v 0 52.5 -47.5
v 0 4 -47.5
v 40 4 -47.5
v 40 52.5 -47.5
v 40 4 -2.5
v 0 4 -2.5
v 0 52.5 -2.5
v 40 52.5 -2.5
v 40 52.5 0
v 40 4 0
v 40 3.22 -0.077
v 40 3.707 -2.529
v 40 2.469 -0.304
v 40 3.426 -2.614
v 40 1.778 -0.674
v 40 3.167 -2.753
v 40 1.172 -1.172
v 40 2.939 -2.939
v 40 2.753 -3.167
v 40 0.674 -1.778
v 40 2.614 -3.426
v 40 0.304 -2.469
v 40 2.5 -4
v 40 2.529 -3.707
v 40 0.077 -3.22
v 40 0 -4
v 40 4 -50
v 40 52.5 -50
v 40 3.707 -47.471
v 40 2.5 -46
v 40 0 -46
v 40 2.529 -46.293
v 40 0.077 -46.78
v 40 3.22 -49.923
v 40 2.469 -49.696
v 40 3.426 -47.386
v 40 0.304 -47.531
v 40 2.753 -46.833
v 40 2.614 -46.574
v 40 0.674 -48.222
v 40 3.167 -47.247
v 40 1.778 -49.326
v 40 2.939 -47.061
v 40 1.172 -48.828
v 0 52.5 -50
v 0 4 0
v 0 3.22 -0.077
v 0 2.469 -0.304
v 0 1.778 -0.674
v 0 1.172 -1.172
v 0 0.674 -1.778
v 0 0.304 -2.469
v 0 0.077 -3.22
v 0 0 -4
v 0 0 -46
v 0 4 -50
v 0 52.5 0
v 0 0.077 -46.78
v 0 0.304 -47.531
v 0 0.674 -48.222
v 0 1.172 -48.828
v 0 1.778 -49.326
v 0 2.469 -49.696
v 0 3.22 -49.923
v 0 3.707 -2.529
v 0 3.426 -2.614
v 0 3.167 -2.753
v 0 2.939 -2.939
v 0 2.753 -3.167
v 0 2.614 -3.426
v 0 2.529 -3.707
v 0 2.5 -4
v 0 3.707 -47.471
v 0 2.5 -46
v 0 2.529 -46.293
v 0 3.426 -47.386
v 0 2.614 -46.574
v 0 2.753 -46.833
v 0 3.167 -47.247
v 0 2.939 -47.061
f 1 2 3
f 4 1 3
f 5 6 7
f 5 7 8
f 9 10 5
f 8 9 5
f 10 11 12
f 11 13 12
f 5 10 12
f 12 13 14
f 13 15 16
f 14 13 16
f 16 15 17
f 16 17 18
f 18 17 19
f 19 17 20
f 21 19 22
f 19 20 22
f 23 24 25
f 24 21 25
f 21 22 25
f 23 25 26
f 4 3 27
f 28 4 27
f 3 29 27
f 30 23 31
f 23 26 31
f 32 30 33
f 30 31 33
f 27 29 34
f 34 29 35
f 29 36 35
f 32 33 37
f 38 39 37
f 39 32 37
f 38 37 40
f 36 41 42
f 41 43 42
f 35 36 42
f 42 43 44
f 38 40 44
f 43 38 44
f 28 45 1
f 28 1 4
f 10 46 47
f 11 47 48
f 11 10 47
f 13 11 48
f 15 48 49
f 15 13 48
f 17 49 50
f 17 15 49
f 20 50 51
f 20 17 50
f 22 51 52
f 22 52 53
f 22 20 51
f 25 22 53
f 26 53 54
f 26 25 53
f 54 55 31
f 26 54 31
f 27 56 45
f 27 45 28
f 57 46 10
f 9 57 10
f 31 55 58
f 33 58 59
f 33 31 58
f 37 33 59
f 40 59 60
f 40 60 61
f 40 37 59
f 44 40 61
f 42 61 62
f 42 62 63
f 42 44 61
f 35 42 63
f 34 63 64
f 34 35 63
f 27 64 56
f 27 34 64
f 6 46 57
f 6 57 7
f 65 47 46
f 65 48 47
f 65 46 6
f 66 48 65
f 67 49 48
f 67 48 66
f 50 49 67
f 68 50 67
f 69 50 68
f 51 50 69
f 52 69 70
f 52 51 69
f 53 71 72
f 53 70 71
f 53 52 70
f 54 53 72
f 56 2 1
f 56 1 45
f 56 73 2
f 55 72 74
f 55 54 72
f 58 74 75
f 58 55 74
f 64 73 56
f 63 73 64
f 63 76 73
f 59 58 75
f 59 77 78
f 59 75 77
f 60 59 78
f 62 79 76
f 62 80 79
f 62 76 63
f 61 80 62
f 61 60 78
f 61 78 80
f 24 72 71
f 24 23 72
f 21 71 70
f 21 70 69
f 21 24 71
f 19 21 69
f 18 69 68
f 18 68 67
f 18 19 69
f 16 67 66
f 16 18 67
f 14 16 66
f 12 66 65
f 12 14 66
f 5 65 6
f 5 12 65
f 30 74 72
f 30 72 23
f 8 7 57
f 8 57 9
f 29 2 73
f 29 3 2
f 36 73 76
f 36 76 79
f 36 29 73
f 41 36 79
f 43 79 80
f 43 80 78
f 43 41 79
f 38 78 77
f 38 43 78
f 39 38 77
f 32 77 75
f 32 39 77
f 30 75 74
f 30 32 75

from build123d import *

# Parameters (mm, degrees)
SKETCH1_W           = 40
SKETCH1_H           = 50
BOSS_EXTRUDE1_DEPTH = 2.5
SKETCH2_W           = 40
SKETCH2_H           = 2.5
BOSS_EXTRUDE2_DEPTH = 50
FILLET1_R           = 4
FILLET2_R           = 1.5


with BuildPart() as part:
    # Sketch1 → Boss-Extrude1 (new body)
    with BuildSketch(Plane(origin=(0, 0, 0), x_dir=(1, 0, 0), z_dir=(0, 1, 0))):
        with Locations((20, 25)):
            Rectangle(SKETCH1_W, SKETCH1_H)
    extrude(amount=BOSS_EXTRUDE1_DEPTH)

    # Sketch2 → Boss-Extrude2 (add)
    with BuildSketch(Plane(origin=(0, 2.5, 0), x_dir=(1, 0, 0), z_dir=(0, 1, 0))):
        with Locations((20, 48.75)):
            Rectangle(SKETCH2_W, SKETCH2_H)
        with Locations((20, 1.25)):
            Rectangle(SKETCH2_W, SKETCH2_H)
    extrude(amount=BOSS_EXTRUDE2_DEPTH)

    # Fillet1
    fillet1_edges = [part.edges().sort_by_distance(p)[0] for p in [
        (20, 0, -50),
        (20, 0, 0),
    ]]
    fillet(fillet1_edges, radius=FILLET1_R)

    # Fillet2
    fillet2_edges = [part.edges().sort_by_distance(p)[0] for p in [
        (20, 2.5, -47.5),
        (20, 2.5, -2.5),
    ]]
    fillet(fillet2_edges, radius=FILLET2_R)


solid = part.part
